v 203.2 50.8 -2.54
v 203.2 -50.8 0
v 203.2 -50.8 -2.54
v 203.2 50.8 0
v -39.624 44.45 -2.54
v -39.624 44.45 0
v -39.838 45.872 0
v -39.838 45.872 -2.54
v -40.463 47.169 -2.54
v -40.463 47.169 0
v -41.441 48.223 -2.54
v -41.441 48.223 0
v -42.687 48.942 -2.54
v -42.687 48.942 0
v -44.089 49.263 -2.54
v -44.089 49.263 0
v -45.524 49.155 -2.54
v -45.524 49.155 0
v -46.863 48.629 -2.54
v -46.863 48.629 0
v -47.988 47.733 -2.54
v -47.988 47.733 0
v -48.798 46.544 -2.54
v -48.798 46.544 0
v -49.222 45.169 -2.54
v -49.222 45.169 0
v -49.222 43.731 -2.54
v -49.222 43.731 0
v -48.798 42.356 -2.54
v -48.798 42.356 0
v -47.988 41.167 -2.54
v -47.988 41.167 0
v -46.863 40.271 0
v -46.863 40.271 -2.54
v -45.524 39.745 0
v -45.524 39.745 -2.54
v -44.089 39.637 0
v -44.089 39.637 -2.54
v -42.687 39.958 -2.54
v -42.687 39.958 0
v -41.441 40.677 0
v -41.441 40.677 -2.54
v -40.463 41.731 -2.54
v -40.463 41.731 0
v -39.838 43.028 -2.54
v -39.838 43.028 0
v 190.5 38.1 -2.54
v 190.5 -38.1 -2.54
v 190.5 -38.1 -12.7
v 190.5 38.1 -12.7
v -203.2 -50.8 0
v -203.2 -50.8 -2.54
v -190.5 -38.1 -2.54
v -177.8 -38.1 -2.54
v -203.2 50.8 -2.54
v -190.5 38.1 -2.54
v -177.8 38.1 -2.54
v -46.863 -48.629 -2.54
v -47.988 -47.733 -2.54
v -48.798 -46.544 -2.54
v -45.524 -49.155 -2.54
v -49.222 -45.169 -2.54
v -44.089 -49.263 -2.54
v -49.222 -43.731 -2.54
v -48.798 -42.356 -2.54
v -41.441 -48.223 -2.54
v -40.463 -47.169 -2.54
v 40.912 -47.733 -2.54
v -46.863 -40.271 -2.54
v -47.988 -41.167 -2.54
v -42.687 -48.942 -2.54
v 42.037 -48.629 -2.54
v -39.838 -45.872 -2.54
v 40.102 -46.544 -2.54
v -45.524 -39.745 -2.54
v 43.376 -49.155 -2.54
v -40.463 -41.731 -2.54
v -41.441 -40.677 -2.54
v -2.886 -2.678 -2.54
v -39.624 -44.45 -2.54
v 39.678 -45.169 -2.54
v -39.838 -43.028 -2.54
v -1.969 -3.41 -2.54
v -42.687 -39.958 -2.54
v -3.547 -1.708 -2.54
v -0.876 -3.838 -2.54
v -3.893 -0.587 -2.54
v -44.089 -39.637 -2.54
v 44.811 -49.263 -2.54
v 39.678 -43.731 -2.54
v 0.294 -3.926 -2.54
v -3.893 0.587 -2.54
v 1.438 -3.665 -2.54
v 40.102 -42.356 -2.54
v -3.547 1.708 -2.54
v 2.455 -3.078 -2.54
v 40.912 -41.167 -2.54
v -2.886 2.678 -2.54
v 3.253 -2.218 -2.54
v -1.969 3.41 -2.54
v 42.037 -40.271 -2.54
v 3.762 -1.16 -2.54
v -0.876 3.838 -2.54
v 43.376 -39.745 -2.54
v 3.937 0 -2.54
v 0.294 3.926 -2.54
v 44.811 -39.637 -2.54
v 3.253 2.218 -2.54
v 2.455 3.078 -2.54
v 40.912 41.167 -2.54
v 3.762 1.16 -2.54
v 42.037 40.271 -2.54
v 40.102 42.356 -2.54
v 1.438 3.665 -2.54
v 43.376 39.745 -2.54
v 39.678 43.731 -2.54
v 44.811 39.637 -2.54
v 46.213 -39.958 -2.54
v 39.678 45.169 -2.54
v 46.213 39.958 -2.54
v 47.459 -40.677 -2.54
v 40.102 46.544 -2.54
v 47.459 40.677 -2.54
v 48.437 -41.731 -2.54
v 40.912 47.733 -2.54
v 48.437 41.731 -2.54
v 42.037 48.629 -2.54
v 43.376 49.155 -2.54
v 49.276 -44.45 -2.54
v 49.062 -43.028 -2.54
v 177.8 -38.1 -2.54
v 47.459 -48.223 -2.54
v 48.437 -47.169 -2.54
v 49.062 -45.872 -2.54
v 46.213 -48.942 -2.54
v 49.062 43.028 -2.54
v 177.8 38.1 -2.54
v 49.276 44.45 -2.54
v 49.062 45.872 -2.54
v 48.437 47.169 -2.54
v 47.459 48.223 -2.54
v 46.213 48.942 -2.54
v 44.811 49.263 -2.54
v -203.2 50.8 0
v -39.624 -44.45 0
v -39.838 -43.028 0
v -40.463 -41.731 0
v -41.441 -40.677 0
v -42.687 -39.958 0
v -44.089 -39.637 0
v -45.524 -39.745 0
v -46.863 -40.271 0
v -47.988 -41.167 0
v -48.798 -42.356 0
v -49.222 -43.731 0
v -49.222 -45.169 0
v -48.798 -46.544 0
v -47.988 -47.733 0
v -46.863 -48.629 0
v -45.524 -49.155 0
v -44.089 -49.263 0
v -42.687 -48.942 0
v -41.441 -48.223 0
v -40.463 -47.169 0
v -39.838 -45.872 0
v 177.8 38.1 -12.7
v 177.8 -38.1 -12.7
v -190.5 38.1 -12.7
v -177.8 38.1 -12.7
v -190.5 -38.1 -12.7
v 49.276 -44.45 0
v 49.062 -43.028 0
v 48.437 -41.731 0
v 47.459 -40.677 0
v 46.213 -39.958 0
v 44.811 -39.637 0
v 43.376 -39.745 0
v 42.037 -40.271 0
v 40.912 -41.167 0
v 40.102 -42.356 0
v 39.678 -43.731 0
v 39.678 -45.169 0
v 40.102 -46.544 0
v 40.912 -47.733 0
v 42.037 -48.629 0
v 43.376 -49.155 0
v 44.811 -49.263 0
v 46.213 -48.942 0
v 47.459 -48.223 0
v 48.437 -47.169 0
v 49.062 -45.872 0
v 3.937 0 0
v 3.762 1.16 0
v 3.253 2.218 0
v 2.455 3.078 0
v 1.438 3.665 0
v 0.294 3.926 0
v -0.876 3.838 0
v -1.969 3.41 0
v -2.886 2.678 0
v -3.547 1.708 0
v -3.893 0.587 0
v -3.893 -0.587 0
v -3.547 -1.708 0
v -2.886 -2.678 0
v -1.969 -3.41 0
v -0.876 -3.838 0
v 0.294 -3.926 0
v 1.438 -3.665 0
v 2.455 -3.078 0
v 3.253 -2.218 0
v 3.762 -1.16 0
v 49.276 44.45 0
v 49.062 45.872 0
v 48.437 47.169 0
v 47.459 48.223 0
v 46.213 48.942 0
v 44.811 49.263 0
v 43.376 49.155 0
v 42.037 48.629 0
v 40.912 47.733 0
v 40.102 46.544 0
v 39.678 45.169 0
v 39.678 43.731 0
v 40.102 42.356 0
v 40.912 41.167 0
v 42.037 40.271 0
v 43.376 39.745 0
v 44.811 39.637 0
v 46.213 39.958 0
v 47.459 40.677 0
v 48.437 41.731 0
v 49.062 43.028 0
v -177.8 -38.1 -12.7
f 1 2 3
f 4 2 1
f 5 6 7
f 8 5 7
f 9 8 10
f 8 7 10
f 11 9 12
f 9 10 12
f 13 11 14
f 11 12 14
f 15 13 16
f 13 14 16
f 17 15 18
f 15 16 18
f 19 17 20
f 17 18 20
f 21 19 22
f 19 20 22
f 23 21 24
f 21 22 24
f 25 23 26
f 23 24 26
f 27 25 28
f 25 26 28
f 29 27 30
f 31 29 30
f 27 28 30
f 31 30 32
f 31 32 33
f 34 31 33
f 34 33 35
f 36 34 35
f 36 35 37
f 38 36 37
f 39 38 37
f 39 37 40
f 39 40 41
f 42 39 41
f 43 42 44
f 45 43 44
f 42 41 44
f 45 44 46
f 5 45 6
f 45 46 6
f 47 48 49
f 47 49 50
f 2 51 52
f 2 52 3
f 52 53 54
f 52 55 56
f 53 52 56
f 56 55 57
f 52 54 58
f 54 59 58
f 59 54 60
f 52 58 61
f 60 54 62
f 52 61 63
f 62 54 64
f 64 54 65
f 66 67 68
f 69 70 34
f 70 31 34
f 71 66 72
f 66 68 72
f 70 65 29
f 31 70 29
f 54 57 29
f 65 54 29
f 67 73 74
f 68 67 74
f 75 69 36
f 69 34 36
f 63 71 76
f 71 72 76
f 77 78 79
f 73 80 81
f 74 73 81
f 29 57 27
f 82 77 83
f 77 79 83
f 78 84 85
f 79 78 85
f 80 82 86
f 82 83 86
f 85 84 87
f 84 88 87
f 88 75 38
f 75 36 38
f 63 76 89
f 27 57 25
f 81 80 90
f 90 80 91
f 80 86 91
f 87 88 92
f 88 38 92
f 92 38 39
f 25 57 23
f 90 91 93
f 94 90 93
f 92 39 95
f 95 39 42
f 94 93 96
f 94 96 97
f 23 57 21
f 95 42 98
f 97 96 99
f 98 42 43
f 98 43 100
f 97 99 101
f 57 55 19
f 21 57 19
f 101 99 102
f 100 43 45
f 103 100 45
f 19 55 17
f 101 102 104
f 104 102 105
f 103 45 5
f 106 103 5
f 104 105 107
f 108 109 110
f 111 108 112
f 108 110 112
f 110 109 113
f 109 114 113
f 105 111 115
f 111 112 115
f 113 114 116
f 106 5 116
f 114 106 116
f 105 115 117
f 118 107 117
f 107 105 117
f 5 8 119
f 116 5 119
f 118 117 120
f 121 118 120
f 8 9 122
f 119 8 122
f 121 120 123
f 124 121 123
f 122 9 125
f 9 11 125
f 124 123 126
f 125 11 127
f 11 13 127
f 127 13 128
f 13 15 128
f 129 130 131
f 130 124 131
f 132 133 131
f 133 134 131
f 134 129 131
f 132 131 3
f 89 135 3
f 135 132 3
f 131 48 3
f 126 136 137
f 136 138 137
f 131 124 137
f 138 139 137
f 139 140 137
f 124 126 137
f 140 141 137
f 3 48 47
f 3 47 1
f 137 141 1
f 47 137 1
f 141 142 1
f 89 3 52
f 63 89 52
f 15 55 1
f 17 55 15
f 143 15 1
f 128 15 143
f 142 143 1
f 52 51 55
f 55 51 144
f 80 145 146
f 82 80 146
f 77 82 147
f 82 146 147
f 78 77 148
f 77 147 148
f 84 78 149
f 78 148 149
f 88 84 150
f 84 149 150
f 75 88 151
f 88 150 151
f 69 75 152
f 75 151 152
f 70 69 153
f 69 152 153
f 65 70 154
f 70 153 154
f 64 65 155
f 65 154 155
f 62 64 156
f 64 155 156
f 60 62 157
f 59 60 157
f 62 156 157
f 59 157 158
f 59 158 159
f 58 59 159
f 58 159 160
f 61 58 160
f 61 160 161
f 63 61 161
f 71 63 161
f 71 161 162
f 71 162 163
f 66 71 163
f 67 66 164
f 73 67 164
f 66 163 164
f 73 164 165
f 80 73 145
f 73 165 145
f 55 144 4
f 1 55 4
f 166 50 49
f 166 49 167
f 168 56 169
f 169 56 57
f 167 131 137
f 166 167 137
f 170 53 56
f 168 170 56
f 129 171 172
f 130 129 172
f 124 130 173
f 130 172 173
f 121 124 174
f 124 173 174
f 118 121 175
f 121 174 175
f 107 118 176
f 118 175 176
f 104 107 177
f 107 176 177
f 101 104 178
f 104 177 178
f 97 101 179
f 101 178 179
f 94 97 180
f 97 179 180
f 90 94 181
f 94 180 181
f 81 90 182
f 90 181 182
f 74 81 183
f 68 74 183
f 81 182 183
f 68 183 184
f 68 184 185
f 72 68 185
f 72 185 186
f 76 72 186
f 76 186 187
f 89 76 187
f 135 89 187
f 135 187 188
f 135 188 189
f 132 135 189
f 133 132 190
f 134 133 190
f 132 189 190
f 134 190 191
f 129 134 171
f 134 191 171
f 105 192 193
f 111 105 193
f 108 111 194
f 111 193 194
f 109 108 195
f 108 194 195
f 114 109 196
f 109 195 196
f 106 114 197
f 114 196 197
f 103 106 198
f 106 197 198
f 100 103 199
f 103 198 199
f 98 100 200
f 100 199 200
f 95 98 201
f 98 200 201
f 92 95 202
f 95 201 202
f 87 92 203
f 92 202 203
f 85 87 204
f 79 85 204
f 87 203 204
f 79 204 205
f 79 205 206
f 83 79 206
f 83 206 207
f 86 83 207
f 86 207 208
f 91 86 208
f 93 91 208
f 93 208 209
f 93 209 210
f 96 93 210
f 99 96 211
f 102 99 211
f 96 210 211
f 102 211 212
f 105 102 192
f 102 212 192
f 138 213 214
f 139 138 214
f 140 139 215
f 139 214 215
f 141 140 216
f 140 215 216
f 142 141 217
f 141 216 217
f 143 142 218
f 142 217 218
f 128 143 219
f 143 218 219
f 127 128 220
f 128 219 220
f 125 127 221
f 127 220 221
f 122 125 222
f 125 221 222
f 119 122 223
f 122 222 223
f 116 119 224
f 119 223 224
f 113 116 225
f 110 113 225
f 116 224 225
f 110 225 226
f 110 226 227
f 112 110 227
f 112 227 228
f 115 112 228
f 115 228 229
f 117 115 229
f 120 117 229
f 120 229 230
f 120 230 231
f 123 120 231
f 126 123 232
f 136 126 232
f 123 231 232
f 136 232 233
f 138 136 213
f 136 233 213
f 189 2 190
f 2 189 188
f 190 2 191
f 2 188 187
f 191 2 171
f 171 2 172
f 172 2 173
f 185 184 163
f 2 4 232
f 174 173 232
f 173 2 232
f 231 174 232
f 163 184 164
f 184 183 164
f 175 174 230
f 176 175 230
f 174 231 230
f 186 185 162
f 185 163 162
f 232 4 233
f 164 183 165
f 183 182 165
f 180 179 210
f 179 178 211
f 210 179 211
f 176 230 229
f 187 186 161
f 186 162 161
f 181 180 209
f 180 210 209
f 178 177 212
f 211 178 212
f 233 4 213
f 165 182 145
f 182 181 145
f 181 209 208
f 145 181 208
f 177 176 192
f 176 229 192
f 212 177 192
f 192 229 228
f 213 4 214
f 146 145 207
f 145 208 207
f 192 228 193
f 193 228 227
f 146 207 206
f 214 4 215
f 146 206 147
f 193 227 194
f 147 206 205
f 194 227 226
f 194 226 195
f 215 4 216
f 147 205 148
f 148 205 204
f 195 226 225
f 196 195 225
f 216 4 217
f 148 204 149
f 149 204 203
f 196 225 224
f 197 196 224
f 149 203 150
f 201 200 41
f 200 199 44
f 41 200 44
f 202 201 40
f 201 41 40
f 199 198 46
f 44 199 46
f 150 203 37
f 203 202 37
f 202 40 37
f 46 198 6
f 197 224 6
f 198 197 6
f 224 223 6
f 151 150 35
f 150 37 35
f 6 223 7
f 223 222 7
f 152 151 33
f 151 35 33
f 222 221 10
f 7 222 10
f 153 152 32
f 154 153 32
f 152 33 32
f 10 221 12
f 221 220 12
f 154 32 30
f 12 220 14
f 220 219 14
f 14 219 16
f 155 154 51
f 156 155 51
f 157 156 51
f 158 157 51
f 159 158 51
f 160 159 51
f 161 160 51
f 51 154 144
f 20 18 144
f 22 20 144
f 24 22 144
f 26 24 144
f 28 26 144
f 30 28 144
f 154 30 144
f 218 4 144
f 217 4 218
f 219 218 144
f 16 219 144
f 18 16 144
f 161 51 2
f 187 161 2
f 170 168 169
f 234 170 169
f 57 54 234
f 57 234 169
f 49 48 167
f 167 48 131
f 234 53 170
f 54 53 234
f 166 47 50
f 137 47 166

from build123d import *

# Parameters (mm, degrees)
SKETCH2_W           = 406.4
SKETCH2_H           = 101.6
BOSS_EXTRUDE2_DEPTH = 2.54
SKETCH3_R           = 4.826
CUT_EXTRUDE1_DEPTH  = 2.54
SKETCH4_R           = 3.937
CUT_EXTRUDE2_DEPTH  = 2.54
SKETCH5_W           = 12.7
SKETCH5_H           = 76.2
BOSS_EXTRUDE4_DEPTH = 12.7


with BuildPart() as part:
    # Sketch2 → Boss-Extrude2 (new body)
    with BuildSketch(Plane.XY):
        Rectangle(SKETCH2_W, SKETCH2_H)
    extrude(amount=-BOSS_EXTRUDE2_DEPTH)

    # Sketch3 → Cut-Extrude1 (cut)
    with BuildSketch(Plane.XY):
        with Locations((-44.45, 44.45)):
            Circle(SKETCH3_R)
        with Locations((44.45, 44.45)):
            Circle(SKETCH3_R)
        with Locations((44.45, -44.45)):
            Circle(SKETCH3_R)
        with Locations((-44.45, -44.45)):
            Circle(SKETCH3_R)
    extrude(amount=-CUT_EXTRUDE1_DEPTH, mode=Mode.SUBTRACT)

    # Sketch4 → Cut-Extrude2 (cut)
    with BuildSketch(Plane.XY):
        Circle(SKETCH4_R)
    extrude(amount=-CUT_EXTRUDE2_DEPTH, mode=Mode.SUBTRACT)

    # Sketch5 → Boss-Extrude4 (add)
    with BuildSketch(Plane.XY):
        with Locations((-184.15, 0)):
            Rectangle(SKETCH5_W, SKETCH5_H)
    boss_extrude4 = extrude(amount=-BOSS_EXTRUDE4_DEPTH)

    # Mirror2: Boss-Extrude4 across plane
    add(boss_extrude4.mirror(Plane(origin=(0, 0, 0), x_dir=(0, 0, 1), z_dir=(1, 0, 0))))


solid = part.part
